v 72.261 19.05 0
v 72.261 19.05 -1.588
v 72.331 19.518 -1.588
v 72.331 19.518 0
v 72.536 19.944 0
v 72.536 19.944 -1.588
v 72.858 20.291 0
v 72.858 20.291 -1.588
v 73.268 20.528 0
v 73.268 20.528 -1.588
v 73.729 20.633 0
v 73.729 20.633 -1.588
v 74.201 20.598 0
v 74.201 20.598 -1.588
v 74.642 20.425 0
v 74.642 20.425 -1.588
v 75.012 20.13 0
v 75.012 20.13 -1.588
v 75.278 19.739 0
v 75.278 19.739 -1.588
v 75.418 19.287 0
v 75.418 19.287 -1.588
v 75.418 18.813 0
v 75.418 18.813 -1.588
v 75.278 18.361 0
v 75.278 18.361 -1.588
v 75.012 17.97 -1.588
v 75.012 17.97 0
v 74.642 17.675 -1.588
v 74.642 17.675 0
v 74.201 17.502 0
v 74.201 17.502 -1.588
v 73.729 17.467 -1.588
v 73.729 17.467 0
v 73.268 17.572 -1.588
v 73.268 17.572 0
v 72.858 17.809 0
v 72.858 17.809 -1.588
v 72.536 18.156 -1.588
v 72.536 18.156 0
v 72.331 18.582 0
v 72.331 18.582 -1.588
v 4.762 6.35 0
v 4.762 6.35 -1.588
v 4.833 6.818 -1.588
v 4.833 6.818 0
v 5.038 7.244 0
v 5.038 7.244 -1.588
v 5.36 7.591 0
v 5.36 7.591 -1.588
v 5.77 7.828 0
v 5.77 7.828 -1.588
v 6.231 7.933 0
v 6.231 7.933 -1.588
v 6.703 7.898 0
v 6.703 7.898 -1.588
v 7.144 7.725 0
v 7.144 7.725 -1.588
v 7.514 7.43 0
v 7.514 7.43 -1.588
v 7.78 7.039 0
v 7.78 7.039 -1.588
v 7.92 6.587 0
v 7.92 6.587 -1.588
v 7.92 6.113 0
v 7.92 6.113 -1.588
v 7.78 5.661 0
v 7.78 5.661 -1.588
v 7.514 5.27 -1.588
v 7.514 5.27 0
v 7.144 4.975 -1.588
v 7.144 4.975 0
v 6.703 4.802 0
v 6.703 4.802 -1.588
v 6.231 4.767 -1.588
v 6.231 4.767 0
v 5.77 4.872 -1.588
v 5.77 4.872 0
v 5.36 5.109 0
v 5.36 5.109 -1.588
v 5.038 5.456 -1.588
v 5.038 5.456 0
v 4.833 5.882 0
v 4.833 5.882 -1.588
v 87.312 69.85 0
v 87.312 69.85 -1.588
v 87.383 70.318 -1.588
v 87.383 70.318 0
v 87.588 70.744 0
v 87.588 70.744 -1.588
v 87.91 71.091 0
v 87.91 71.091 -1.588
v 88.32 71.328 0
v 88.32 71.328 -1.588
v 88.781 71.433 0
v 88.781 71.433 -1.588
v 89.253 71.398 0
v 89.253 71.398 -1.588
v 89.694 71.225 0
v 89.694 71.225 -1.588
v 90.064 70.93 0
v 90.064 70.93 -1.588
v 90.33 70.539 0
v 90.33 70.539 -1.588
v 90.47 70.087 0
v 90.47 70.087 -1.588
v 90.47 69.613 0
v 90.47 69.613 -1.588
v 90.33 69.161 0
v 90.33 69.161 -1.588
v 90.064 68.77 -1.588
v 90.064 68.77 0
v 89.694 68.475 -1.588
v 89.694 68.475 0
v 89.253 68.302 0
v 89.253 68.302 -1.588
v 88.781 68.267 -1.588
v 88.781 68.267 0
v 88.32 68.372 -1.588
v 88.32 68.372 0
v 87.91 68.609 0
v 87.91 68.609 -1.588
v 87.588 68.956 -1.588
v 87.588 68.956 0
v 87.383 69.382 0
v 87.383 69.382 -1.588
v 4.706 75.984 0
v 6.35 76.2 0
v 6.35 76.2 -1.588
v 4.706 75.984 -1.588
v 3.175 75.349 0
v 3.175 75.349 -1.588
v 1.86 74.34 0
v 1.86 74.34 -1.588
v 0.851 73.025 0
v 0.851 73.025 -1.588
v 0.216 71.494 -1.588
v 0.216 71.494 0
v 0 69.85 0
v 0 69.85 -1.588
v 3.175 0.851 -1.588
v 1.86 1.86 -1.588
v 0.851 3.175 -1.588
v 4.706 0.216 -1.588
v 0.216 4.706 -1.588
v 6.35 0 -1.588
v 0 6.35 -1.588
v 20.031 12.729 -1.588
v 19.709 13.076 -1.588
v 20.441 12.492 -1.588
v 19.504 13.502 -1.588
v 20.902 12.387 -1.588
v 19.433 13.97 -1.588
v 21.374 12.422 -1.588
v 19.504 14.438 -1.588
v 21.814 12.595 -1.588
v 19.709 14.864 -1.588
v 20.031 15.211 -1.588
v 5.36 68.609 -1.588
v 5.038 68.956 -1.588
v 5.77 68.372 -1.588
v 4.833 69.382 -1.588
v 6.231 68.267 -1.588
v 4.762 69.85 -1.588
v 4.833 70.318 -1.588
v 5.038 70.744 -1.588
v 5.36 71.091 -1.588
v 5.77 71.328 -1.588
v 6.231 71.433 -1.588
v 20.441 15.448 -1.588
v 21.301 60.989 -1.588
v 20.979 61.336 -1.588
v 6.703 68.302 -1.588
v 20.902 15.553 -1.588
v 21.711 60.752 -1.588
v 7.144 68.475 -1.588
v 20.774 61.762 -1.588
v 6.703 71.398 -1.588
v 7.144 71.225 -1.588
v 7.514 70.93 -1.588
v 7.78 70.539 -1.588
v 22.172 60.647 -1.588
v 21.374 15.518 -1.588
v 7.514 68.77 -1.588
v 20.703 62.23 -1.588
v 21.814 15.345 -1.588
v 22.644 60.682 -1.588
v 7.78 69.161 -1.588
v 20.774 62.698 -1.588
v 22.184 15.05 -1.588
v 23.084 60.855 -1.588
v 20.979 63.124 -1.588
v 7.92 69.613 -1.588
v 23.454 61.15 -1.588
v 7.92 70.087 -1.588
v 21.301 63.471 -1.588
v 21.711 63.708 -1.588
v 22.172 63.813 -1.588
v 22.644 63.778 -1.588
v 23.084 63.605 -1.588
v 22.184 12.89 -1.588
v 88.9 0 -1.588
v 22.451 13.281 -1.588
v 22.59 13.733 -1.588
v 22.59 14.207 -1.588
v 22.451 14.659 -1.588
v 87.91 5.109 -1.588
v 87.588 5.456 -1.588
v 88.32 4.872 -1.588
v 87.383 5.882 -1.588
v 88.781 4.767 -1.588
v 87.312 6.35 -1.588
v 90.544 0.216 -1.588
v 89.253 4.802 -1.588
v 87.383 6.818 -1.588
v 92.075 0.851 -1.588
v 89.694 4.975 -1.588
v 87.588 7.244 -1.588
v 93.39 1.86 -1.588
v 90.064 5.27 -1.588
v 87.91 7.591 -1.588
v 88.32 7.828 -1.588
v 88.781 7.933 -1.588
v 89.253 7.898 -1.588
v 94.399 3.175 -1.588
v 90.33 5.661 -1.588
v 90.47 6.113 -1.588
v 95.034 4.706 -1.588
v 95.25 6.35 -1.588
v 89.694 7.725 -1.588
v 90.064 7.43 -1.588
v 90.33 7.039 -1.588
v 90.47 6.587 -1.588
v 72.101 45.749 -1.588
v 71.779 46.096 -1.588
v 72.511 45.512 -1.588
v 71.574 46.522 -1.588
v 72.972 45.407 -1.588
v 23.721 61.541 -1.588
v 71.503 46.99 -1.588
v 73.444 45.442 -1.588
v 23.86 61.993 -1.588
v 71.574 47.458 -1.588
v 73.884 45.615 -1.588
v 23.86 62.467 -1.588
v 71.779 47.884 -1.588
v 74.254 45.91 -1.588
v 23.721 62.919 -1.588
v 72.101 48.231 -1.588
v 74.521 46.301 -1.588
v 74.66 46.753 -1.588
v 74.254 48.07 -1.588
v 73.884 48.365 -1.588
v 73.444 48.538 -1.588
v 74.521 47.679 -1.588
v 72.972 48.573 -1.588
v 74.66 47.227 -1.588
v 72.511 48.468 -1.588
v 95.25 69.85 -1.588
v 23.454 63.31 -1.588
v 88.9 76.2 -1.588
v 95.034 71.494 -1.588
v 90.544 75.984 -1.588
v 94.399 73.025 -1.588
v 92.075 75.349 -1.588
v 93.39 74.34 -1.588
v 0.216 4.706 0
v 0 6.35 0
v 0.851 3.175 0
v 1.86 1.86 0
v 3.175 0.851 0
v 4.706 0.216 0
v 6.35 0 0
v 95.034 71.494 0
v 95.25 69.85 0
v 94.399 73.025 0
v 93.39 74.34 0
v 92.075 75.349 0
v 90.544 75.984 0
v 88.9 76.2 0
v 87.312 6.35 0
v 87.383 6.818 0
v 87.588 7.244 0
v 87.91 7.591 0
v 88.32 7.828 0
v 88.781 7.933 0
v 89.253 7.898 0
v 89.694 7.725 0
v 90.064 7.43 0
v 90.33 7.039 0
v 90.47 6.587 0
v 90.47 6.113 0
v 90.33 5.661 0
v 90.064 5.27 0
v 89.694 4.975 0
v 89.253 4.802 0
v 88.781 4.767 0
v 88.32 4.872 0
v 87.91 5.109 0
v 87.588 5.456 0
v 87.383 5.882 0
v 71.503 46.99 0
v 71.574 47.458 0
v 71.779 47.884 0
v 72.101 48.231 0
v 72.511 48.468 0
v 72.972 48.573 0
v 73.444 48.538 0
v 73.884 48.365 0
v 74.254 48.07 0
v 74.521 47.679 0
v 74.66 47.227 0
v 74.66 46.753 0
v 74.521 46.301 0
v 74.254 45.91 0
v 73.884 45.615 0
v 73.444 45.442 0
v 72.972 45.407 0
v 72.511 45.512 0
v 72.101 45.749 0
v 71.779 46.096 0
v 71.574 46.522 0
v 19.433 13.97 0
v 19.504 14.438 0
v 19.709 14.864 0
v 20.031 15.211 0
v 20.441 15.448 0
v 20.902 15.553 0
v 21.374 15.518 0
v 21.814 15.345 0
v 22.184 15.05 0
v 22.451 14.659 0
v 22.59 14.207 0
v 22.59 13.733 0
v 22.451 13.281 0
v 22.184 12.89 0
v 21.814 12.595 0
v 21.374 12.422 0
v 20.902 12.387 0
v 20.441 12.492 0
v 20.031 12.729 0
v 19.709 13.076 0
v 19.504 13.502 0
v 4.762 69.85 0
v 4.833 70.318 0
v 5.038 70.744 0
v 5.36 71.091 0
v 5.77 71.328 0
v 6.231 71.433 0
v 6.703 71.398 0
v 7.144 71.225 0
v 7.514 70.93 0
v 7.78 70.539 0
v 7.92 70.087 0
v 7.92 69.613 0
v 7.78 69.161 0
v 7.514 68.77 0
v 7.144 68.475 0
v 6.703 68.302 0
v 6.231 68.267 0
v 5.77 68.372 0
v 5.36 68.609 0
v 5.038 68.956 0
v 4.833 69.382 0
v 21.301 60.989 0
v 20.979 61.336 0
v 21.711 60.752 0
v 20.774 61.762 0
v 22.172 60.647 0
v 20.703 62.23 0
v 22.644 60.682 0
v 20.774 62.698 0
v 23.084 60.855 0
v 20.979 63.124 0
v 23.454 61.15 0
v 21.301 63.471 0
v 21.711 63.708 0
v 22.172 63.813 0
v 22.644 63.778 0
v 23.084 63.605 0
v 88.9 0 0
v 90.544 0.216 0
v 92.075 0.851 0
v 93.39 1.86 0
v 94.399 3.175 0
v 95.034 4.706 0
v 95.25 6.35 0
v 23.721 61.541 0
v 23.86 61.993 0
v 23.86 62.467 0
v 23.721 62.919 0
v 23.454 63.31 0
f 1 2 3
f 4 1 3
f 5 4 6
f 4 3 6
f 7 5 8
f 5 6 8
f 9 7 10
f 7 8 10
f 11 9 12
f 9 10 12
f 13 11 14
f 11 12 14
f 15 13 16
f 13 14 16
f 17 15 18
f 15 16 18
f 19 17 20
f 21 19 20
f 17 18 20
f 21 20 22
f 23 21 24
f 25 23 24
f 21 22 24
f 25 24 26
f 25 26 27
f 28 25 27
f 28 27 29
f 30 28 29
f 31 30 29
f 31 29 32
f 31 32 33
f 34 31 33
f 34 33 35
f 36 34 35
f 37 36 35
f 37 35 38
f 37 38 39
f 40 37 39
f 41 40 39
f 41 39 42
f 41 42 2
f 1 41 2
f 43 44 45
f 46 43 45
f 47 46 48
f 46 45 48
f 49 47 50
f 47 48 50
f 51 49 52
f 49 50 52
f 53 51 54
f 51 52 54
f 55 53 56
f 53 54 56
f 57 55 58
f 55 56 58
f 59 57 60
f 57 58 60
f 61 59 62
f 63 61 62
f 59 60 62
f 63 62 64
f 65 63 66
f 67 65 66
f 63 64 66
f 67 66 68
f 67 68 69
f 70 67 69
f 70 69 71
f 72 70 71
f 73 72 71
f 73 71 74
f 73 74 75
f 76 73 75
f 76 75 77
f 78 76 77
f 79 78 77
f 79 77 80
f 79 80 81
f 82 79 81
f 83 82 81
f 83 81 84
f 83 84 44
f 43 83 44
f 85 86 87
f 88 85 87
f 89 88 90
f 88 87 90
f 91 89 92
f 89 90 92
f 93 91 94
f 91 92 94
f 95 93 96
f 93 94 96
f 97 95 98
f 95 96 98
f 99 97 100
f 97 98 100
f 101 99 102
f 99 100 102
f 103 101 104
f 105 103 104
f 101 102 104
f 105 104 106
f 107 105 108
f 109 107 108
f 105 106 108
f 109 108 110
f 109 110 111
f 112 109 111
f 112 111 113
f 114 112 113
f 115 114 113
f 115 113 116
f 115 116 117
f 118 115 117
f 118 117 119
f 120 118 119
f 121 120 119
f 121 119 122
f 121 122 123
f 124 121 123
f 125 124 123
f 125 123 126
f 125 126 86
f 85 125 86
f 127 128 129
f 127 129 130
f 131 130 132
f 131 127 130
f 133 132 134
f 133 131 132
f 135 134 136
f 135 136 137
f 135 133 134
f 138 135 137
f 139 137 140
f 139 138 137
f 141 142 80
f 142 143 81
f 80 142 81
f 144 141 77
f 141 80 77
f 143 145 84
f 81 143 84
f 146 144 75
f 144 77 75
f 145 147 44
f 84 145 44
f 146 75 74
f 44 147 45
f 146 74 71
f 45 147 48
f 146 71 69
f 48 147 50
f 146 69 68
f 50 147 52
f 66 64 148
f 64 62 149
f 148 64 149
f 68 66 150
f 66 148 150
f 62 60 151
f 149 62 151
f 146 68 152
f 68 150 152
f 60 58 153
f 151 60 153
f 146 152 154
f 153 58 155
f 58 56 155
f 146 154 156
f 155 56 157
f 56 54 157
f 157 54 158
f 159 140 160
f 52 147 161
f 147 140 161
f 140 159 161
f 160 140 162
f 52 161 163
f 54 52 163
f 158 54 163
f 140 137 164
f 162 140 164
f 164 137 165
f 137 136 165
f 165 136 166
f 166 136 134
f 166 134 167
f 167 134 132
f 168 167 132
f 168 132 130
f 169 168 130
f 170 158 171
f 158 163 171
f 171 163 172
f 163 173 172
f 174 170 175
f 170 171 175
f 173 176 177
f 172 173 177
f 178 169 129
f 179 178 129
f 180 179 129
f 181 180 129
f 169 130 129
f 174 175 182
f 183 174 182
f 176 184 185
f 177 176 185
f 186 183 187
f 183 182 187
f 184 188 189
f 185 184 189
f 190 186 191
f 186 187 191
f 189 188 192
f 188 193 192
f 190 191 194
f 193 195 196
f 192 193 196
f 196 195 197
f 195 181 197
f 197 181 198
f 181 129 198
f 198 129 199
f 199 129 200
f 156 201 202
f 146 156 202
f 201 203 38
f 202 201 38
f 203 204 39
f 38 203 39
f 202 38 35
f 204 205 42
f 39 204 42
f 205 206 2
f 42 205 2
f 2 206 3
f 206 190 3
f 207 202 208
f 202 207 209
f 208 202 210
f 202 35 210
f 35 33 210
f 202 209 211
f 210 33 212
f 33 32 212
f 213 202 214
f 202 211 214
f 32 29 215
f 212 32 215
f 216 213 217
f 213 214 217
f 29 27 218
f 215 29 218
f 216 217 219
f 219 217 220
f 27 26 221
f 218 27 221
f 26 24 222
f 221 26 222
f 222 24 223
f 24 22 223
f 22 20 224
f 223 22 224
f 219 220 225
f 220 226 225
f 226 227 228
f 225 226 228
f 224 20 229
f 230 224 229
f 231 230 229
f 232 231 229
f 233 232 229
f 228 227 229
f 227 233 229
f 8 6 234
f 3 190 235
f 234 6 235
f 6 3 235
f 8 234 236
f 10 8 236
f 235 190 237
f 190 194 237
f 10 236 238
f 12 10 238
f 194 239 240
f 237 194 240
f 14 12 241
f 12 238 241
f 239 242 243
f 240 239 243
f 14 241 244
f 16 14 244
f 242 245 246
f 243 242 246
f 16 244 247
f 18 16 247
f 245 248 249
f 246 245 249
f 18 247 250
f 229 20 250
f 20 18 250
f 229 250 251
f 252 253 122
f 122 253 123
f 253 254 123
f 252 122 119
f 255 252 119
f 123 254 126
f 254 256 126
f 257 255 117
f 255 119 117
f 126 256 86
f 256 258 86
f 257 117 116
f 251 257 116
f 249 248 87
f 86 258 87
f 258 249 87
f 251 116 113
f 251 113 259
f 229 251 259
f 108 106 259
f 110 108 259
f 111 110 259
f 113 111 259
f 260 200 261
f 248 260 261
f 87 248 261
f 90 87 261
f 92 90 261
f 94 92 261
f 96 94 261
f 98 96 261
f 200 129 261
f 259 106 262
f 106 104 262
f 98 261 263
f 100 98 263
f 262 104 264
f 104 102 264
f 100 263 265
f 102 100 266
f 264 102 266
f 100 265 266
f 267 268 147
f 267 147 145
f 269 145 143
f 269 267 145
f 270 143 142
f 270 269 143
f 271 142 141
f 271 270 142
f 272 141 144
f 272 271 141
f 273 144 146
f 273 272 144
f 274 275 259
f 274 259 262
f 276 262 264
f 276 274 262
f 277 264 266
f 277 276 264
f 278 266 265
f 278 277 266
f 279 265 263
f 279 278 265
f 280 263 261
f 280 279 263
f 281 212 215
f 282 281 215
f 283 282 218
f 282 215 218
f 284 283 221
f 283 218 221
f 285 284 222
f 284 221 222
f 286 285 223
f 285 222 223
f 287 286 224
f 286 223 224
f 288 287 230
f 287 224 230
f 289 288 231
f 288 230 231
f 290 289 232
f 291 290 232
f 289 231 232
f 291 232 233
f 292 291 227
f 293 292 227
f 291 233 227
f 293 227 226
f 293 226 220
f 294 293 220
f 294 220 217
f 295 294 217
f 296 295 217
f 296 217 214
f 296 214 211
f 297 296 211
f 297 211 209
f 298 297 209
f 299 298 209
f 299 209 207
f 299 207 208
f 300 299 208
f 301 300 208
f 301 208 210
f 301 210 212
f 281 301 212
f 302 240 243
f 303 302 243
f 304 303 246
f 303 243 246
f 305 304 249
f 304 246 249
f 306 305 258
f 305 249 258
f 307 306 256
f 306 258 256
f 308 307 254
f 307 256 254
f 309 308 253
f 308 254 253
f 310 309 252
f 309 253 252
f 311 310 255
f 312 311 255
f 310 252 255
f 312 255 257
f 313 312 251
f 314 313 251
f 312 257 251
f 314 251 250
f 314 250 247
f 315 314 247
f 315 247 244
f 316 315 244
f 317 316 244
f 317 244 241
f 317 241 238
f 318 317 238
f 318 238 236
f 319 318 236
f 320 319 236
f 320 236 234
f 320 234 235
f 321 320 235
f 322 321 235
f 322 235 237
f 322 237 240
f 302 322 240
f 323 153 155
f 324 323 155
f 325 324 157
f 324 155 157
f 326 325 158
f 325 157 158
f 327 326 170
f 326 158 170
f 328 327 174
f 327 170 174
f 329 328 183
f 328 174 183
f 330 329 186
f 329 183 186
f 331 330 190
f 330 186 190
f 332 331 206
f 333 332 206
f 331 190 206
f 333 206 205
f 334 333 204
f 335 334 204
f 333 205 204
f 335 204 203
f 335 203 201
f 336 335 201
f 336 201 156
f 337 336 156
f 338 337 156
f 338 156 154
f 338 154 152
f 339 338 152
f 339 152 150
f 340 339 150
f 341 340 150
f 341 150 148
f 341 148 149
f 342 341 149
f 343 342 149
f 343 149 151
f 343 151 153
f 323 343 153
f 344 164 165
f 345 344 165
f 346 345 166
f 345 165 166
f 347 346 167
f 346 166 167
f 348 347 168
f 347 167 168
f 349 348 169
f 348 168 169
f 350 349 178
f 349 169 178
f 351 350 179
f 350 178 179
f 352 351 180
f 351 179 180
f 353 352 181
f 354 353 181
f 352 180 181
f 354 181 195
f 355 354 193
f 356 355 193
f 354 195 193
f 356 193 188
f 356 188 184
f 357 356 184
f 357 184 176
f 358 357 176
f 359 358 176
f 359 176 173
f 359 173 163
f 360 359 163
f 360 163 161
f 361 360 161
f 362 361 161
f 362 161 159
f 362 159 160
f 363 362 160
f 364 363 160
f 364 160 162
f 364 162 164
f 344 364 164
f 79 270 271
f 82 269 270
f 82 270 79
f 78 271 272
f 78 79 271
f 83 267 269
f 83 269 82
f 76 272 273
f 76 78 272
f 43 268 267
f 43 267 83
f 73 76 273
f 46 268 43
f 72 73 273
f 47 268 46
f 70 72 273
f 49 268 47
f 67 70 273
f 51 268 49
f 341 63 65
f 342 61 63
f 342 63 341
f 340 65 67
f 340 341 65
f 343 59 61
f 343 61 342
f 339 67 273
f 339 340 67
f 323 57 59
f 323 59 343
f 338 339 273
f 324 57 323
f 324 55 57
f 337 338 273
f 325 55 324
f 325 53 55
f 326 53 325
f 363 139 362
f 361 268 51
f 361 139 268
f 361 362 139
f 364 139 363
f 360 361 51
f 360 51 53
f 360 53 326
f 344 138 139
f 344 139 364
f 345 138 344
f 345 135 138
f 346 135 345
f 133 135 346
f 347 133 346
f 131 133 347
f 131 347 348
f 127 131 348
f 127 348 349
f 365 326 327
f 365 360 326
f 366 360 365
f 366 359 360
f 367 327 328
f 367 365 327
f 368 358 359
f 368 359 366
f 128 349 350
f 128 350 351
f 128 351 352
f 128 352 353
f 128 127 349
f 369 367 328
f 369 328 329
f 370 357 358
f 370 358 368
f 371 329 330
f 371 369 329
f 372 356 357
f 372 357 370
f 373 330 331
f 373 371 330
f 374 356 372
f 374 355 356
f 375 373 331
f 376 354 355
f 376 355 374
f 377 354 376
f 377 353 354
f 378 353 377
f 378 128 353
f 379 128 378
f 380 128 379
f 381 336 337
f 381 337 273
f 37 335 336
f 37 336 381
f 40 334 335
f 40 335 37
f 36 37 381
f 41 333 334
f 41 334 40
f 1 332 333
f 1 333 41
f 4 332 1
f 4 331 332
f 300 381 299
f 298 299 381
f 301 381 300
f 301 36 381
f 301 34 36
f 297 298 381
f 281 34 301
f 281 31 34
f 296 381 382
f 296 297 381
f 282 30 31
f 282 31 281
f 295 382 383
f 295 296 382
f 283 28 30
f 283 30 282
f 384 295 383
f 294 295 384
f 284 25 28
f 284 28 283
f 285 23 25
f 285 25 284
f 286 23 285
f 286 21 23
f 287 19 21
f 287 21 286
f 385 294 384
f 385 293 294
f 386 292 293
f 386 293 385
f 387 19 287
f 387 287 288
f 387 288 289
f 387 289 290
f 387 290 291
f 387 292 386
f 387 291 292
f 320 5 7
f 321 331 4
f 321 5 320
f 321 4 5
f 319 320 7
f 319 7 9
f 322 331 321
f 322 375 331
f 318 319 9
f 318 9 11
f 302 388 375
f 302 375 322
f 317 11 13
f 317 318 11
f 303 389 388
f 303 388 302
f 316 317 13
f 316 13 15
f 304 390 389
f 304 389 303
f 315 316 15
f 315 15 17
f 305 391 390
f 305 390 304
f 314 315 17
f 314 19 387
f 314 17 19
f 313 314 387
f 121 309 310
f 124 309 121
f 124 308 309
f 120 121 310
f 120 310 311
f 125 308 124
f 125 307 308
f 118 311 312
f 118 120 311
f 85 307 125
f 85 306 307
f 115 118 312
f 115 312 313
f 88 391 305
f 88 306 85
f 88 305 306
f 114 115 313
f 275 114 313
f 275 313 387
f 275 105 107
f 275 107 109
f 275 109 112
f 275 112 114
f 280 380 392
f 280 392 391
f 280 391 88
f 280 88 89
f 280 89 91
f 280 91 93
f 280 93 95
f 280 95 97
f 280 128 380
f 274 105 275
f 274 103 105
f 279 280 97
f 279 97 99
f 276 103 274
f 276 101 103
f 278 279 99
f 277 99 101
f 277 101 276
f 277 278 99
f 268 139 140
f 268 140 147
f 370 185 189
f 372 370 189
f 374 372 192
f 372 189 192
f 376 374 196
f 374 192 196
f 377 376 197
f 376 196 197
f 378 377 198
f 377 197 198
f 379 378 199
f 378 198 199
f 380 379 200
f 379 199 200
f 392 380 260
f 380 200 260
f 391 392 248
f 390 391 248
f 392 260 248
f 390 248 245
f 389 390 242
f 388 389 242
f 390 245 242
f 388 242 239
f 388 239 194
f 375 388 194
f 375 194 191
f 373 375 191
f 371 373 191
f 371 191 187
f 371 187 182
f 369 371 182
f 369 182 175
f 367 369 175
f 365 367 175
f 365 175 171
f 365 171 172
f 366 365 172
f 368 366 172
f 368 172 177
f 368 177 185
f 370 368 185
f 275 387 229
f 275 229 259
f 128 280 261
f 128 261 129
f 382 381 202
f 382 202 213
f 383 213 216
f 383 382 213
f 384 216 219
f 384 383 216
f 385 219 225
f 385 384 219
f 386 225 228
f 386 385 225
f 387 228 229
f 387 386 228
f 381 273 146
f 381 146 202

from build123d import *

# Parameters (mm, degrees)
F1_DEPTH = 1.5875
F2_D     = 3.175


with BuildPart() as f1:
    # F0 (on Top) → F1 (new body)
    with BuildSketch(Plane.XY):
        with BuildLine():
            ThreePointArc((0, 6.35), (1.859872, 1.859872), (6.35, 0))
            Line((6.35, 0), (88.9, 0))
            ThreePointArc((88.9, 0), (93.390128, 1.859872), (95.25, 6.35))
            Line((95.25, 6.35), (95.25, 69.85))
            ThreePointArc((95.25, 69.85), (93.390128, 74.340128), (88.9, 76.2))
            Line((88.9, 76.2), (6.35, 76.2))
            ThreePointArc((6.35, 76.2), (1.859872, 74.340128), (0, 69.85))
            Line((0, 69.85), (0, 6.35))
        make_face()
    extrude(amount=-F1_DEPTH)

    # F2 (through all)
    with Locations(Plane.XY):
        with Locations((6.35, 69.85), (22.290519, 62.23), (73.090519, 46.99), (88.9, 69.85), (88.9, 6.35), (73.848069, 19.05), (21.020519, 13.97), (6.35, 6.35)):
            Hole(F2_D / 2)


solid = f1.part
